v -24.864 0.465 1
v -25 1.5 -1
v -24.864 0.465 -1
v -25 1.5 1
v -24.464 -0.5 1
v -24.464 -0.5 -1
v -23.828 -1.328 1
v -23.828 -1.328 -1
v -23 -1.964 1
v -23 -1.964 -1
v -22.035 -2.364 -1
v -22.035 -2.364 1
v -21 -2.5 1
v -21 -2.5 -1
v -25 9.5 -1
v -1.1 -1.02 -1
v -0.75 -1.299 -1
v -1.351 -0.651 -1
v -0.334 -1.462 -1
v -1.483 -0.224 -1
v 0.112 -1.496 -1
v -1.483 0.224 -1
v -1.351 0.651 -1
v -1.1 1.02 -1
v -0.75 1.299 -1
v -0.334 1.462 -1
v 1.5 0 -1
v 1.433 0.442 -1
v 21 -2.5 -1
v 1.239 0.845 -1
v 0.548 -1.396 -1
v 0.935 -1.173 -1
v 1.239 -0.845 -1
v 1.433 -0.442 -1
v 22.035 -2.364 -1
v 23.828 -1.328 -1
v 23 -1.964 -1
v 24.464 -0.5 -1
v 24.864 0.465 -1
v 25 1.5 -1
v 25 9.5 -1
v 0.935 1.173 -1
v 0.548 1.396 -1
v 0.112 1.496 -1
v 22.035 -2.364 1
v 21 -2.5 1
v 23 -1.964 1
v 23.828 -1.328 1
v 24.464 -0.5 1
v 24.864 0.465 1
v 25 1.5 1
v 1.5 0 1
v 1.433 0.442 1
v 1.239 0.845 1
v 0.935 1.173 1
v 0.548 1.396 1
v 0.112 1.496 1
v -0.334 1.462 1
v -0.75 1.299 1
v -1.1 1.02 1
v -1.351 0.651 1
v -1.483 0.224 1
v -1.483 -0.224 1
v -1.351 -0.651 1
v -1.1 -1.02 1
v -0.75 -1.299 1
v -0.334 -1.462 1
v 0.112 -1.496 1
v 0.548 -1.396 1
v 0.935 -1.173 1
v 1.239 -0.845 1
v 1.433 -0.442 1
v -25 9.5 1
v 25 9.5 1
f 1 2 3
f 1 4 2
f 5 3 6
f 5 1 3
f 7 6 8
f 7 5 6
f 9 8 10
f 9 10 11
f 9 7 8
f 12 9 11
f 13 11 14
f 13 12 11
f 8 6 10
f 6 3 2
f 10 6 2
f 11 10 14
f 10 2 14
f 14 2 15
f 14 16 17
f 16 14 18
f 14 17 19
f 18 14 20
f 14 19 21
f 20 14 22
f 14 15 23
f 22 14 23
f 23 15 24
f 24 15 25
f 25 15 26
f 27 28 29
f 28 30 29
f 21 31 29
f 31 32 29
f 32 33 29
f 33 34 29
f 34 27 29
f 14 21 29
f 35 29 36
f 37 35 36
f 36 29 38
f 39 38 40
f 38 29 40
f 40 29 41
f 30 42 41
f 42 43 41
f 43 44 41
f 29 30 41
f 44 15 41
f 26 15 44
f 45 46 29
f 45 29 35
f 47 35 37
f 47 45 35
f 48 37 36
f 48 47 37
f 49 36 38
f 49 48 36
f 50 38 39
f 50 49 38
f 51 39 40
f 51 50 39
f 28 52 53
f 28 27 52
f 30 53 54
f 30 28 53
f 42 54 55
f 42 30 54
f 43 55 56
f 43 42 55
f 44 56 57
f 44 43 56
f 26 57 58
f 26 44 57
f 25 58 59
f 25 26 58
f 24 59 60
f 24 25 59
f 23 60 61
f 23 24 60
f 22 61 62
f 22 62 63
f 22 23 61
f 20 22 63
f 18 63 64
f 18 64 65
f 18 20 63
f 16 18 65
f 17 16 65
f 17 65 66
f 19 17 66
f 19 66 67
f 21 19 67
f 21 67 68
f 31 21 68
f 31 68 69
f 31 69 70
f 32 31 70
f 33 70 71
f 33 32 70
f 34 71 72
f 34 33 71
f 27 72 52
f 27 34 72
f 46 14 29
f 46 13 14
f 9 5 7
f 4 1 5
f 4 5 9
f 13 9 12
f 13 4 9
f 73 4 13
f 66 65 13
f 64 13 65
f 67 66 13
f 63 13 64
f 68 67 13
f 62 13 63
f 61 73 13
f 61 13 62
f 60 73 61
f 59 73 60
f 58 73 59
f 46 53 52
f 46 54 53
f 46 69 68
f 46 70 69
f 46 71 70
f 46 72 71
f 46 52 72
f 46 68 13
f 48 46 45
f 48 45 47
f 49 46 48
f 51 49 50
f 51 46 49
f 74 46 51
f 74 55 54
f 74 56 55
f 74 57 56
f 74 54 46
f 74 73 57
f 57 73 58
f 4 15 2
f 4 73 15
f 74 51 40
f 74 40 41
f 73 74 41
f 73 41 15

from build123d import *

# Parameters (mm, degrees)
SKETCH1_R           = 1.5
BOSS_EXTRUDE1_DEPTH = 1


with BuildPart() as part:
    # Sketch1 → Boss-Extrude1 (new, symmetric)
    with BuildSketch(Plane.XY):
        with BuildLine():
            Line((-21, -2.5), (21, -2.5))
            ThreePointArc((21, -2.5), (23.828427125, -1.328427125), (25, 1.5))
            Line((25, 1.5), (25, 9.5))
            Line((25, 9.5), (-25, 9.5))
            Line((-25, 9.5), (-25, 1.5))
            ThreePointArc((-25, 1.5), (-23.828427125, -1.328427125), (-21, -2.5))
        make_face()
        Circle(SKETCH1_R, mode=Mode.SUBTRACT)
    extrude(amount=BOSS_EXTRUDE1_DEPTH, both=True)


solid = part.part
